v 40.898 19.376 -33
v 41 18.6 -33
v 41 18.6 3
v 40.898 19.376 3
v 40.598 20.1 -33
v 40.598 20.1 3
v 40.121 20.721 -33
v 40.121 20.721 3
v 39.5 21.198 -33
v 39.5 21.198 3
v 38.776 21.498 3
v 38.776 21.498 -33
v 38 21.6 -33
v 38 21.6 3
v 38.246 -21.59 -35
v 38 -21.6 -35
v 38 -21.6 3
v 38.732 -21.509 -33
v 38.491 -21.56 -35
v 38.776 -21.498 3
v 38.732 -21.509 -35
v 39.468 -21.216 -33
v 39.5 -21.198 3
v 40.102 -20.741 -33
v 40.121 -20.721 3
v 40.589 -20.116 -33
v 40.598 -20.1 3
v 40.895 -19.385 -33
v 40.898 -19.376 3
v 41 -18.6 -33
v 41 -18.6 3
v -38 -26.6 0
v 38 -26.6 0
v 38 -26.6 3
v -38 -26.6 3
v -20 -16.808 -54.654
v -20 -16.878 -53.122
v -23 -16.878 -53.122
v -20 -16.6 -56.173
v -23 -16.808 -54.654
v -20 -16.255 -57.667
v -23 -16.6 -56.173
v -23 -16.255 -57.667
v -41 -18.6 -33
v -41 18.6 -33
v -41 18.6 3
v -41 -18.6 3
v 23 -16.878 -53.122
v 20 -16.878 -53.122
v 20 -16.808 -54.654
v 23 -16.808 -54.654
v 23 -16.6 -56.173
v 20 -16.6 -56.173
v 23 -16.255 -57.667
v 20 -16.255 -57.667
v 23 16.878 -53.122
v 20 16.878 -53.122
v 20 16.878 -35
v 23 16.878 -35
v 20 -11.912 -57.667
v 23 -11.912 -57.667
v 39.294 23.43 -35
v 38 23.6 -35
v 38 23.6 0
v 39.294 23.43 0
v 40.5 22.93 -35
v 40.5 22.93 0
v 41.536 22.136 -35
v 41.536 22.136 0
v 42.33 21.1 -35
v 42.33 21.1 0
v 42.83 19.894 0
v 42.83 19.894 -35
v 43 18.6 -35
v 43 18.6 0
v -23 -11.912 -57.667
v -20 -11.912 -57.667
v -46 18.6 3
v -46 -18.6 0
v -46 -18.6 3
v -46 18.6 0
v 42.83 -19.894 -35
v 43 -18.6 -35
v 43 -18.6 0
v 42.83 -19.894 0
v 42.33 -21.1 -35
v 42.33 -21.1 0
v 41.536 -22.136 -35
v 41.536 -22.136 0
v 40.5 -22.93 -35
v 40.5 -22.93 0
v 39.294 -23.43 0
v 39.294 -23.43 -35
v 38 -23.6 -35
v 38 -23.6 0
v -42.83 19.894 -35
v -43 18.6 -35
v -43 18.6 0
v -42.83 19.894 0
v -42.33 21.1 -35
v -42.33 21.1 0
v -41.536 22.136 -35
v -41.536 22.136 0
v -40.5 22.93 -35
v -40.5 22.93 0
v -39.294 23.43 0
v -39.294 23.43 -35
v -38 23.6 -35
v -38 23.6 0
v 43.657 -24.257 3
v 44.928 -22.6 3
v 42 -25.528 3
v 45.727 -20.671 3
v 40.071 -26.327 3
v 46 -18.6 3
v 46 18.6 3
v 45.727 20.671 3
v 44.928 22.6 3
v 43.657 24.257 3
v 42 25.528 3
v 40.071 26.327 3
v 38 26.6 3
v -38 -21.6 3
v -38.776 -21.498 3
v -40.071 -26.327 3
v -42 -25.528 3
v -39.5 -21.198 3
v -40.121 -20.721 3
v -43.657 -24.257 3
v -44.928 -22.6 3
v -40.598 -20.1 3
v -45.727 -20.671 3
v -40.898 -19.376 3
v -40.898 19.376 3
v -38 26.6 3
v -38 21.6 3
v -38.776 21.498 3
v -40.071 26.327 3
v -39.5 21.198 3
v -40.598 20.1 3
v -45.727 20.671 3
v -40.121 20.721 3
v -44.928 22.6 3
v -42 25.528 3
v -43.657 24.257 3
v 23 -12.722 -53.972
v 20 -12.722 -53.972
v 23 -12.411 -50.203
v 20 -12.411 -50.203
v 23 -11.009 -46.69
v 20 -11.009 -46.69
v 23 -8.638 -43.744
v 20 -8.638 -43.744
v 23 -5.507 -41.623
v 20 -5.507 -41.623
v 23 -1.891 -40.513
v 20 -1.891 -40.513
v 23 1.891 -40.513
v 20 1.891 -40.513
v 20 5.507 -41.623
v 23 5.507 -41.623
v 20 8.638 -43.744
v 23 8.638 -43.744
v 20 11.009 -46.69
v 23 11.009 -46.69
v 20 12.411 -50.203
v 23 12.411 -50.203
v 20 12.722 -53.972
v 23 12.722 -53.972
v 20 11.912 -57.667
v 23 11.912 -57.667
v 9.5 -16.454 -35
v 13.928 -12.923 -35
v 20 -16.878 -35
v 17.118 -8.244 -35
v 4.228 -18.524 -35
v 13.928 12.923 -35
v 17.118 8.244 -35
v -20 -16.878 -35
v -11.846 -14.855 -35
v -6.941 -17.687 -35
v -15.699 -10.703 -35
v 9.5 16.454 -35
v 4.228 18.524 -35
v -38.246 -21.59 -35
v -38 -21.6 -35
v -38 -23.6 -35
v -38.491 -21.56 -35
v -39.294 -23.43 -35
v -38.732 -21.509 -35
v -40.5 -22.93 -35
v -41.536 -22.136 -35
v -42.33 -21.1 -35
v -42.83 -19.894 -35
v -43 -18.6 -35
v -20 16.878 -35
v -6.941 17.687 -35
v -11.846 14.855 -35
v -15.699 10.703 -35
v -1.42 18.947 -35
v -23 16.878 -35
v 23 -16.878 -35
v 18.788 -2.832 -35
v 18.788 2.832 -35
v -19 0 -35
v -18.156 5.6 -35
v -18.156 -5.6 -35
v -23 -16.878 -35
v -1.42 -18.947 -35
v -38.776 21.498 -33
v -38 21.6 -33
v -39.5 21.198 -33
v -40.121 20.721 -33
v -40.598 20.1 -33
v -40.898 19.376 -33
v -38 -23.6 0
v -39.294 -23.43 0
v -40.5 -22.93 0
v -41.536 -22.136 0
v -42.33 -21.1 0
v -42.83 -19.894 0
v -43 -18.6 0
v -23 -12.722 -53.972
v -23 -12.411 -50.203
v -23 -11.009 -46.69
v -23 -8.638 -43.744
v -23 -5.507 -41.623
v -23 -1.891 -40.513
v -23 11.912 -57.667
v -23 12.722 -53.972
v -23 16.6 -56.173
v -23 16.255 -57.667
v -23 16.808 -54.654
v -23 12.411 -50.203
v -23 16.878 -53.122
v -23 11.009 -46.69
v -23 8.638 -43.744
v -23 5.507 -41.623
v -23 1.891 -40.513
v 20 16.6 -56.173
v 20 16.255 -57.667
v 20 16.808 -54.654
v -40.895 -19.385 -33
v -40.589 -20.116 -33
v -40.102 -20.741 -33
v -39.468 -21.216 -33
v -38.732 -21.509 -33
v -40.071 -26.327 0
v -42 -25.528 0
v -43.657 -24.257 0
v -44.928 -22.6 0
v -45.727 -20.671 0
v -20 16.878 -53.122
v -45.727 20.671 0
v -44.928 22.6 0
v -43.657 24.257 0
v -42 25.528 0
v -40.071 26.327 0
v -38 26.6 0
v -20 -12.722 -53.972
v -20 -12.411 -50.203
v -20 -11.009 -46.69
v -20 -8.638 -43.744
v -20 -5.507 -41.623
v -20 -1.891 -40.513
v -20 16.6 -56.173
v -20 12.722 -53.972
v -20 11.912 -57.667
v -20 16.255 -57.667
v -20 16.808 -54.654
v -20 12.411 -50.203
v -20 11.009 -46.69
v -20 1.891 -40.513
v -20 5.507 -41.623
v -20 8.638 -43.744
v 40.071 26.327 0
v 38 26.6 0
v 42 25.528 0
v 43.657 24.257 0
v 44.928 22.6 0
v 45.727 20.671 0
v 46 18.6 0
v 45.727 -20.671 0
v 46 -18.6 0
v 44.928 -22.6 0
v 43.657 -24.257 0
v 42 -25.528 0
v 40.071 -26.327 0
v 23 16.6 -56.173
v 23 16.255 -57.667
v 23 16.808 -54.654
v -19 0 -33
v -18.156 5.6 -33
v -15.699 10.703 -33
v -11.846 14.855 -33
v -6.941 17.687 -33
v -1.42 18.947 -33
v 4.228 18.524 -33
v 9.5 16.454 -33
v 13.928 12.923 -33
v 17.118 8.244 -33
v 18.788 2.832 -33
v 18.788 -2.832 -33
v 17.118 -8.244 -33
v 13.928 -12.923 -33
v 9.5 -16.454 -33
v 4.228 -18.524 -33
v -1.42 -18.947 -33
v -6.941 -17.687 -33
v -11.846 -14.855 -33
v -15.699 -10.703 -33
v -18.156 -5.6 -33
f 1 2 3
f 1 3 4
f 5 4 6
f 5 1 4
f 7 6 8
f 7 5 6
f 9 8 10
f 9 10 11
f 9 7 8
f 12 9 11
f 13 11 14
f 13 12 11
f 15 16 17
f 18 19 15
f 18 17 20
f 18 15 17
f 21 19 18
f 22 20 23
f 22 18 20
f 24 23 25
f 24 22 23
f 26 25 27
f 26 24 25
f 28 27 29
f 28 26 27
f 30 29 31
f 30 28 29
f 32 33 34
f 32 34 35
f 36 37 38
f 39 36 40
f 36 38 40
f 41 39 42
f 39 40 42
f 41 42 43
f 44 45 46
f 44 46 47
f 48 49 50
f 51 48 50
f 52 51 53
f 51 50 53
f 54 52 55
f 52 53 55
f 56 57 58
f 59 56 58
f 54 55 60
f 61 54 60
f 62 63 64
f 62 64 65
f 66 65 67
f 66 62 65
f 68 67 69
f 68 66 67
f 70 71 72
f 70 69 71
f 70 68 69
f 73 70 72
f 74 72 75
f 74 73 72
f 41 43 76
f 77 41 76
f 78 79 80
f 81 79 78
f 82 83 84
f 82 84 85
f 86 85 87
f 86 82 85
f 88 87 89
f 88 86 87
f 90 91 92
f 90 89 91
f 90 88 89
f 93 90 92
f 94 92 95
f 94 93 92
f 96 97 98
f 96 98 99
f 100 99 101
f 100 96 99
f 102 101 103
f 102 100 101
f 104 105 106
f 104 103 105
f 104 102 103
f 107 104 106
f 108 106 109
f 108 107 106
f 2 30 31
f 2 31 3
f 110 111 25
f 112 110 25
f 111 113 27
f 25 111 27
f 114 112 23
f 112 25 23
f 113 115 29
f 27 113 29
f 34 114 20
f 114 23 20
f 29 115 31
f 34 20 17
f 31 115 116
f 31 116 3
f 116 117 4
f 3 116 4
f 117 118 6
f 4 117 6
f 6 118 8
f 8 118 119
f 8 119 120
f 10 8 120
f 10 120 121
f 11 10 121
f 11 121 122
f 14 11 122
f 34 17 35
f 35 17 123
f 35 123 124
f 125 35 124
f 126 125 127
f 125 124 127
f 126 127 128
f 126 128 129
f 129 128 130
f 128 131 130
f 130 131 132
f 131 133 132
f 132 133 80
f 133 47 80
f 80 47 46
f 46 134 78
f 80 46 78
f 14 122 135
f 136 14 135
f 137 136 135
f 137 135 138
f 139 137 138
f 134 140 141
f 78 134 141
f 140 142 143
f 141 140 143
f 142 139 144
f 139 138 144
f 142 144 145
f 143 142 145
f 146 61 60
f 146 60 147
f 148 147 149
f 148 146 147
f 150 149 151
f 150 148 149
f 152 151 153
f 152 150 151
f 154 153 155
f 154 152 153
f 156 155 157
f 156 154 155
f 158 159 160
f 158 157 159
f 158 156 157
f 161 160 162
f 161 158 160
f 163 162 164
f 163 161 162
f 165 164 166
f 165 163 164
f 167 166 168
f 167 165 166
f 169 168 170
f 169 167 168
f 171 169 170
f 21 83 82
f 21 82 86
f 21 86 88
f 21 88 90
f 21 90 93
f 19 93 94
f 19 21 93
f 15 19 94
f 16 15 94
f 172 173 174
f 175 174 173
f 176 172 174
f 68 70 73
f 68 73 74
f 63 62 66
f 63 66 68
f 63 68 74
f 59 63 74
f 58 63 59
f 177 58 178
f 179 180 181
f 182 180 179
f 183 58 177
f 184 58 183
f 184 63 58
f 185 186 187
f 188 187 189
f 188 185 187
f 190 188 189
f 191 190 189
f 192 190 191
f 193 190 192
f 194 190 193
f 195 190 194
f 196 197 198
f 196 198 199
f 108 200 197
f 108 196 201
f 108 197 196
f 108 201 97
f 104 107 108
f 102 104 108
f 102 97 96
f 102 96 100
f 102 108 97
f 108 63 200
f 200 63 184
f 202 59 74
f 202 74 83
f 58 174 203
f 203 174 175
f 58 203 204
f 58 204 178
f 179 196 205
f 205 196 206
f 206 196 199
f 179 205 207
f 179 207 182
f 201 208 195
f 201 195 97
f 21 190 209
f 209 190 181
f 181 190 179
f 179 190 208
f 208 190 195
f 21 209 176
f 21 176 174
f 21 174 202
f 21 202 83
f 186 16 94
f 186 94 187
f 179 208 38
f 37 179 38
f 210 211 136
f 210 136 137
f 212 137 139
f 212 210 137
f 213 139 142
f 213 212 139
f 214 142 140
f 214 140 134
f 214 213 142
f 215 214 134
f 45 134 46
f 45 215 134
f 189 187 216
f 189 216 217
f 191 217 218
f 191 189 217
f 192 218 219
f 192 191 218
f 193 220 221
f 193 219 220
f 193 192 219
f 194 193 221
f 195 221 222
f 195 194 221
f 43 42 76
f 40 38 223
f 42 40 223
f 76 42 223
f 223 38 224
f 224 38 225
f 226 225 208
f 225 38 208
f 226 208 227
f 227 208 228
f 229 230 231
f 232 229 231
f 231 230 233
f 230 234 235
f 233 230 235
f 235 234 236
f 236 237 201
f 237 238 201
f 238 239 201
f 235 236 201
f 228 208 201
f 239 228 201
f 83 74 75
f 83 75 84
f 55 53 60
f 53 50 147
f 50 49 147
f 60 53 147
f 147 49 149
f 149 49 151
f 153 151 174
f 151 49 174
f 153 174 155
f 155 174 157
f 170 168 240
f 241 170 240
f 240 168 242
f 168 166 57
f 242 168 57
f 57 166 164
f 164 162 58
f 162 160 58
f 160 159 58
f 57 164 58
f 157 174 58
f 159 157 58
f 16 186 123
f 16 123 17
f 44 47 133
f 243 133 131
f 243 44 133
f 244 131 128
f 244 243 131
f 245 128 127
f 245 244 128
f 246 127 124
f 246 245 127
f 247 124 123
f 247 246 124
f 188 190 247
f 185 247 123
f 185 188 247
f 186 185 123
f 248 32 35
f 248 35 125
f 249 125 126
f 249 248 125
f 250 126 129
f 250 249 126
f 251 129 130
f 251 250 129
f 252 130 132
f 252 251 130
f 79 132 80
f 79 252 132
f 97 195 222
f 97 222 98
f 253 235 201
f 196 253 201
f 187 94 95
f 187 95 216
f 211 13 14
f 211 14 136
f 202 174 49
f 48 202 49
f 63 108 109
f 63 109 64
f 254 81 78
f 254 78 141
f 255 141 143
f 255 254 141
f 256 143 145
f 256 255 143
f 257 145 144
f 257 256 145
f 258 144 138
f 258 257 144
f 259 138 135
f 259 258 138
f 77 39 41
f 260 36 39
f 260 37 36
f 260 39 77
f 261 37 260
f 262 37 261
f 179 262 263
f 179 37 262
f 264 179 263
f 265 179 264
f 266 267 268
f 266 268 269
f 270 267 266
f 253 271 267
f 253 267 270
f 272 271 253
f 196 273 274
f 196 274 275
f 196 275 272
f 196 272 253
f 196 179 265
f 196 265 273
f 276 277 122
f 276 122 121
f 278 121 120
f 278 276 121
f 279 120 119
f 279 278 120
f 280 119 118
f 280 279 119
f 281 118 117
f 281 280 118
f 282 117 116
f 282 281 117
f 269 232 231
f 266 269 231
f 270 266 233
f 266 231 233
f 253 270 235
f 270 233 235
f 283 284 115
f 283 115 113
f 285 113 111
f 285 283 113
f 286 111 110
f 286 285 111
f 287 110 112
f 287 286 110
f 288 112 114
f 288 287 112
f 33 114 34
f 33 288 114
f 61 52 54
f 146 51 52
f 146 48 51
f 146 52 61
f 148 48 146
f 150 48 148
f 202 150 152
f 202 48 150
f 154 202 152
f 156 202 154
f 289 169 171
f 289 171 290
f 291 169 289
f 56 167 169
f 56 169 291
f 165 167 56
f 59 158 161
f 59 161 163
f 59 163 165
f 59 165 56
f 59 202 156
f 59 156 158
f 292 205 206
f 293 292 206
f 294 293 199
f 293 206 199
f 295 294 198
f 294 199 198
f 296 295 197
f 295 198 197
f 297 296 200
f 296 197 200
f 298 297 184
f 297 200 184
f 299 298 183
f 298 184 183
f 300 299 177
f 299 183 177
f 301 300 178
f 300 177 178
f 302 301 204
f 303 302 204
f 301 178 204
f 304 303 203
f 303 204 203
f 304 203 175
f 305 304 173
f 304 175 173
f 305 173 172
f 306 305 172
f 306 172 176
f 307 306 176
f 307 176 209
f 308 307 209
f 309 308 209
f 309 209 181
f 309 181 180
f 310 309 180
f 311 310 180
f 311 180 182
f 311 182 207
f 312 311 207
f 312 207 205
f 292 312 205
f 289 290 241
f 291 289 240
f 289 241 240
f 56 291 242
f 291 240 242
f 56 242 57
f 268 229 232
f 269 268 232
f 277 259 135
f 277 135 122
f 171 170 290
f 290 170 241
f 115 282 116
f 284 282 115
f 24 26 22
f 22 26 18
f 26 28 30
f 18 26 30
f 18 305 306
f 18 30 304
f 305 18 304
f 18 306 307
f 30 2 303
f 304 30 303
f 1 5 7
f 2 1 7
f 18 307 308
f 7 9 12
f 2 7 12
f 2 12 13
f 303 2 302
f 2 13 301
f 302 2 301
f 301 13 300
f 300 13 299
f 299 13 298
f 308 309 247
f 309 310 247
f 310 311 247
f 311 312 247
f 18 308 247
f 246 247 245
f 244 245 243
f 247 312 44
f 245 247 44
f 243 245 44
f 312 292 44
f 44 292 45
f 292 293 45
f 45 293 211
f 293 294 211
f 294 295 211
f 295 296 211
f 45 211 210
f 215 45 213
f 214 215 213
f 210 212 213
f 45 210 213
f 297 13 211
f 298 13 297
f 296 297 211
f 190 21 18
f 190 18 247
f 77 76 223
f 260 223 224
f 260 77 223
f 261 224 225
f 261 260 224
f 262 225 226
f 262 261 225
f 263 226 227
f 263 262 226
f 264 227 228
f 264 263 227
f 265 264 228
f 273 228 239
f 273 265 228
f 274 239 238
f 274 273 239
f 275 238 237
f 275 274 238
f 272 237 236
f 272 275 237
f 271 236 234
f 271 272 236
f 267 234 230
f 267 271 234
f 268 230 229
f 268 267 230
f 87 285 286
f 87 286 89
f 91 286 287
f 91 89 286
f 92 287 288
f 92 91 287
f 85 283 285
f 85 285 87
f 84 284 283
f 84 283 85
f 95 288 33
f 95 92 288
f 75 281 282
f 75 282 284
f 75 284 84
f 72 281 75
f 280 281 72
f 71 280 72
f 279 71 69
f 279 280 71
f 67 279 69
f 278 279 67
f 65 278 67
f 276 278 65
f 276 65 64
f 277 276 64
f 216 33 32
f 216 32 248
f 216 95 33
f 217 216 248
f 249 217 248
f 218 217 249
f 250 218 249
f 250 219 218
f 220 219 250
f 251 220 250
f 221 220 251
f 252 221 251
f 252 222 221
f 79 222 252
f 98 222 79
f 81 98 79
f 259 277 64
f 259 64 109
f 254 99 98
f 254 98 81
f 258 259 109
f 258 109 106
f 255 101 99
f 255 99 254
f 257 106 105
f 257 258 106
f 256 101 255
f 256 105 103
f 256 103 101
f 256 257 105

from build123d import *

# Parameters (mm, degrees)
BOSS_EXTRUDE1_DEPTH = 3
BOSS_EXTRUDE2_START = -38
BOSS_EXTRUDE2_DEPTH = 38
SKETCH3_R           = 19
BOSS_EXTRUDE3_DEPTH = 2
SKETCH4_W           = 3
SKETCH4_H           = 42
BOSS_EXTRUDE4_DEPTH = 35
CUT_EXTRUDE1_START  = -46
SKETCH5_R           = 12.75
CUT_EXTRUDE1_DEPTH  = 46
CUT_EXTRUDE2_REACH  = 103.826
CUT_EXTRUDE3_REACH  = 103.826
SKETCH7_W           = 14.582252834
SKETCH7_H           = 33.756


with BuildPart() as part:
    # Sketch1 → Boss-Extrude1 (new body)
    with BuildSketch(Plane.XY):
        with BuildLine():
            Line((-38, 26.6), (38, 26.6))
            ThreePointArc((38, 26.6), (43.656854249, 24.256854249), (46, 18.6))
            Line((46, 18.6), (46, -18.6))
            ThreePointArc((46, -18.6), (43.656854249, -24.256854249), (38, -26.6))
            Line((38, -26.6), (-38, -26.6))
            ThreePointArc((-38, -26.6), (-43.656854249, -24.256854249), (-46, -18.6))
            Line((-46, -18.6), (-46, 18.6))
            ThreePointArc((-46, 18.6), (-43.656854249, 24.256854249), (-38, 26.6))
        make_face()
        with BuildLine():
            Line((-38, -23.6), (38, -23.6))
            ThreePointArc((38, -23.6), (41.535533906, -22.135533906), (43, -18.6))
            Line((43, -18.6), (43, 18.6))
            ThreePointArc((43, 18.6), (41.535533906, 22.135533906), (38, 23.6))
            Line((38, 23.6), (-38, 23.6))
            ThreePointArc((-38, 23.6), (-41.535533906, 22.135533906), (-43, 18.6))
            Line((-43, 18.6), (-43, -18.6))
            ThreePointArc((-43, -18.6), (-41.535533906, -22.135533906), (-38, -23.6))
        make_face(mode=Mode.SUBTRACT)
    extrude(amount=BOSS_EXTRUDE1_DEPTH)

    # Sketch2 → Boss-Extrude2 (add)
    with BuildSketch(Plane.XY.offset(3).offset(BOSS_EXTRUDE2_START)):
        with BuildLine():
            Line((43, 18.6), (43, -18.6))
            ThreePointArc((43, -18.6), (41.535533906, -22.135533906), (38, -23.6))
            Line((38, -23.6), (-38, -23.6))
            ThreePointArc((-38, -23.6), (-41.535533906, -22.135533906), (-43, -18.6))
            Line((-43, -18.6), (-43, 18.6))
            ThreePointArc((-43, 18.6), (-41.535533906, 22.135533906), (-38, 23.6))
            Line((-38, 23.6), (38, 23.6))
            ThreePointArc((38, 23.6), (41.535533906, 22.135533906), (43, 18.6))
        make_face()
        with BuildLine():
            ThreePointArc((41, 18.6), (40.121320344, 20.721320344), (38, 21.6))
            Line((38, 21.6), (-38, 21.6))
            ThreePointArc((-38, 21.6), (-40.121320344, 20.721320344), (-41, 18.6))
            Line((-41, 18.6), (-41, -18.6))
            ThreePointArc((-41, -18.6), (-40.121320344, -20.721320344), (-38, -21.6))
            Line((-38, -21.6), (38, -21.6))
            ThreePointArc((38, -21.6), (40.121320344, -20.721320344), (41, -18.6))
            Line((41, -18.6), (41, 18.6))
        make_face(mode=Mode.SUBTRACT)
    extrude(amount=BOSS_EXTRUDE2_DEPTH)

    # Sketch3 → Boss-Extrude3 (add)
    with BuildSketch(Plane(origin=(0, 0, -35), x_dir=(-1, 0, 0), z_dir=(0, 0, -1))):
        with BuildLine():
            ThreePointArc((41, 18.6), (40.121320344, 20.721320344), (38, 21.6))
            Line((38, 21.6), (-38, 21.6))
            ThreePointArc((-38, 21.6), (-40.121320344, 20.721320344), (-41, 18.6))
            Line((-41, 18.6), (-41, -18.6))
            ThreePointArc((-41, -18.6), (-40.365961681, -20.444512219), (-38.731849783, -21.509363486))
            Line((-38.731849783, -21.509363486), (38.731849783, -21.509363486))
            ThreePointArc((38.731849783, -21.509363486), (40.365961681, -20.444512219), (41, -18.6))
            Line((41, -18.6), (41, 18.6))
        make_face()
        Circle(SKETCH3_R, mode=Mode.SUBTRACT)
    extrude(amount=-BOSS_EXTRUDE3_DEPTH)

    # Sketch4 → Boss-Extrude4 (add)
    with BuildSketch(Plane(origin=(0, 0, -35), x_dir=(-1, 0, 0), z_dir=(0, 0, -1))):
        with Locations((-21.5, 2.6)):
            Rectangle(SKETCH4_W, SKETCH4_H)
        with Locations((21.5, 2.6)):
            Rectangle(SKETCH4_W, SKETCH4_H)
    extrude(amount=BOSS_EXTRUDE4_DEPTH)

    # Sketch5 → Cut-Extrude1 (cut)
    with BuildSketch(Plane.ZY.offset(23).offset(CUT_EXTRUDE1_START)):
        with Locations(Location((-53.122, 0, 0), (0, 0, 270))):
            Circle(SKETCH5_R)
    extrude(amount=CUT_EXTRUDE1_DEPTH, mode=Mode.SUBTRACT)

    # Cut-Extrude2: up to this face of the body (flat: up to its plane)
    cut_extrude2_end = Plane(part.part.faces().sort_by_distance((23, -17.853282523, -52.5))[0])
    # Sketch6 → Cut-Extrude2 (cut, up to the picked face)
    with BuildSketch(Plane.ZY.offset(23), mode=Mode.PRIVATE) as cut_extrude2_sk1:
        with BuildLine():
            ThreePointArc((-53.122, -16.878), (-65.056548253, -11.934548253), (-70, 0))
            Line((-70, 0), (-70, -18.4))
            Line((-70, -18.4), (-35, -18.4))
            Line((-35, -18.4), (-35, -16.878))
            Line((-35, -16.878), (-53.122, -16.878))
        make_face()
    cut_extrude2_tool1 = split(extrude(cut_extrude2_sk1.sketch, amount=-CUT_EXTRUDE2_REACH, mode=Mode.PRIVATE), bisect_by=cut_extrude2_end, keep=Keep.BOTH, mode=Mode.PRIVATE)
    # Sketch6 → Cut-Extrude2 (cut, up to the picked face)
    with BuildSketch(Plane.ZY.offset(23), mode=Mode.PRIVATE) as cut_extrude2_sk2:
        with BuildLine():
            ThreePointArc((-70, 0), (-65.056548253, 11.934548253), (-53.122, 16.878))
            Line((-53.122, 16.878), (-35, 16.878))
            Line((-35, 16.878), (-35, 23.6))
            Line((-35, 23.6), (-70, 23.6))
            Line((-70, 23.6), (-70, 0))
        make_face()
    cut_extrude2_tool2 = split(extrude(cut_extrude2_sk2.sketch, amount=-CUT_EXTRUDE2_REACH, mode=Mode.PRIVATE), bisect_by=cut_extrude2_end, keep=Keep.BOTH, mode=Mode.PRIVATE)
    add(cut_extrude2_tool1.solids().sort_by(Axis((-23, -12.214152, -65.336152), (1, 0, 0)))[0], mode=Mode.SUBTRACT)
    add(cut_extrude2_tool2.solids().sort_by(Axis((-23, 18.768234, -55.331805), (1, 0, 0)))[0], mode=Mode.SUBTRACT)

    # Cut-Extrude3: up to this face of the body (flat: up to its plane)
    cut_extrude3_end = Plane(part.part.faces().sort_by_distance((23, 0, -35.486257909))[0])
    # Sketch7 → Cut-Extrude3 (cut, up to the picked face)
    with BuildSketch(Plane.ZY.offset(23), mode=Mode.PRIVATE) as cut_extrude3_sk1:
        with Locations((-64.958043362, 0)):
            Rectangle(SKETCH7_W, SKETCH7_H)
    cut_extrude3_tool1 = split(extrude(cut_extrude3_sk1.sketch, amount=-CUT_EXTRUDE3_REACH, mode=Mode.PRIVATE), bisect_by=cut_extrude3_end, keep=Keep.BOTH, mode=Mode.PRIVATE)
    add(cut_extrude3_tool1.solids().sort_by(Axis((-23, 0, -64.958043), (1, 0, 0)))[0], mode=Mode.SUBTRACT)


solid = part.part
